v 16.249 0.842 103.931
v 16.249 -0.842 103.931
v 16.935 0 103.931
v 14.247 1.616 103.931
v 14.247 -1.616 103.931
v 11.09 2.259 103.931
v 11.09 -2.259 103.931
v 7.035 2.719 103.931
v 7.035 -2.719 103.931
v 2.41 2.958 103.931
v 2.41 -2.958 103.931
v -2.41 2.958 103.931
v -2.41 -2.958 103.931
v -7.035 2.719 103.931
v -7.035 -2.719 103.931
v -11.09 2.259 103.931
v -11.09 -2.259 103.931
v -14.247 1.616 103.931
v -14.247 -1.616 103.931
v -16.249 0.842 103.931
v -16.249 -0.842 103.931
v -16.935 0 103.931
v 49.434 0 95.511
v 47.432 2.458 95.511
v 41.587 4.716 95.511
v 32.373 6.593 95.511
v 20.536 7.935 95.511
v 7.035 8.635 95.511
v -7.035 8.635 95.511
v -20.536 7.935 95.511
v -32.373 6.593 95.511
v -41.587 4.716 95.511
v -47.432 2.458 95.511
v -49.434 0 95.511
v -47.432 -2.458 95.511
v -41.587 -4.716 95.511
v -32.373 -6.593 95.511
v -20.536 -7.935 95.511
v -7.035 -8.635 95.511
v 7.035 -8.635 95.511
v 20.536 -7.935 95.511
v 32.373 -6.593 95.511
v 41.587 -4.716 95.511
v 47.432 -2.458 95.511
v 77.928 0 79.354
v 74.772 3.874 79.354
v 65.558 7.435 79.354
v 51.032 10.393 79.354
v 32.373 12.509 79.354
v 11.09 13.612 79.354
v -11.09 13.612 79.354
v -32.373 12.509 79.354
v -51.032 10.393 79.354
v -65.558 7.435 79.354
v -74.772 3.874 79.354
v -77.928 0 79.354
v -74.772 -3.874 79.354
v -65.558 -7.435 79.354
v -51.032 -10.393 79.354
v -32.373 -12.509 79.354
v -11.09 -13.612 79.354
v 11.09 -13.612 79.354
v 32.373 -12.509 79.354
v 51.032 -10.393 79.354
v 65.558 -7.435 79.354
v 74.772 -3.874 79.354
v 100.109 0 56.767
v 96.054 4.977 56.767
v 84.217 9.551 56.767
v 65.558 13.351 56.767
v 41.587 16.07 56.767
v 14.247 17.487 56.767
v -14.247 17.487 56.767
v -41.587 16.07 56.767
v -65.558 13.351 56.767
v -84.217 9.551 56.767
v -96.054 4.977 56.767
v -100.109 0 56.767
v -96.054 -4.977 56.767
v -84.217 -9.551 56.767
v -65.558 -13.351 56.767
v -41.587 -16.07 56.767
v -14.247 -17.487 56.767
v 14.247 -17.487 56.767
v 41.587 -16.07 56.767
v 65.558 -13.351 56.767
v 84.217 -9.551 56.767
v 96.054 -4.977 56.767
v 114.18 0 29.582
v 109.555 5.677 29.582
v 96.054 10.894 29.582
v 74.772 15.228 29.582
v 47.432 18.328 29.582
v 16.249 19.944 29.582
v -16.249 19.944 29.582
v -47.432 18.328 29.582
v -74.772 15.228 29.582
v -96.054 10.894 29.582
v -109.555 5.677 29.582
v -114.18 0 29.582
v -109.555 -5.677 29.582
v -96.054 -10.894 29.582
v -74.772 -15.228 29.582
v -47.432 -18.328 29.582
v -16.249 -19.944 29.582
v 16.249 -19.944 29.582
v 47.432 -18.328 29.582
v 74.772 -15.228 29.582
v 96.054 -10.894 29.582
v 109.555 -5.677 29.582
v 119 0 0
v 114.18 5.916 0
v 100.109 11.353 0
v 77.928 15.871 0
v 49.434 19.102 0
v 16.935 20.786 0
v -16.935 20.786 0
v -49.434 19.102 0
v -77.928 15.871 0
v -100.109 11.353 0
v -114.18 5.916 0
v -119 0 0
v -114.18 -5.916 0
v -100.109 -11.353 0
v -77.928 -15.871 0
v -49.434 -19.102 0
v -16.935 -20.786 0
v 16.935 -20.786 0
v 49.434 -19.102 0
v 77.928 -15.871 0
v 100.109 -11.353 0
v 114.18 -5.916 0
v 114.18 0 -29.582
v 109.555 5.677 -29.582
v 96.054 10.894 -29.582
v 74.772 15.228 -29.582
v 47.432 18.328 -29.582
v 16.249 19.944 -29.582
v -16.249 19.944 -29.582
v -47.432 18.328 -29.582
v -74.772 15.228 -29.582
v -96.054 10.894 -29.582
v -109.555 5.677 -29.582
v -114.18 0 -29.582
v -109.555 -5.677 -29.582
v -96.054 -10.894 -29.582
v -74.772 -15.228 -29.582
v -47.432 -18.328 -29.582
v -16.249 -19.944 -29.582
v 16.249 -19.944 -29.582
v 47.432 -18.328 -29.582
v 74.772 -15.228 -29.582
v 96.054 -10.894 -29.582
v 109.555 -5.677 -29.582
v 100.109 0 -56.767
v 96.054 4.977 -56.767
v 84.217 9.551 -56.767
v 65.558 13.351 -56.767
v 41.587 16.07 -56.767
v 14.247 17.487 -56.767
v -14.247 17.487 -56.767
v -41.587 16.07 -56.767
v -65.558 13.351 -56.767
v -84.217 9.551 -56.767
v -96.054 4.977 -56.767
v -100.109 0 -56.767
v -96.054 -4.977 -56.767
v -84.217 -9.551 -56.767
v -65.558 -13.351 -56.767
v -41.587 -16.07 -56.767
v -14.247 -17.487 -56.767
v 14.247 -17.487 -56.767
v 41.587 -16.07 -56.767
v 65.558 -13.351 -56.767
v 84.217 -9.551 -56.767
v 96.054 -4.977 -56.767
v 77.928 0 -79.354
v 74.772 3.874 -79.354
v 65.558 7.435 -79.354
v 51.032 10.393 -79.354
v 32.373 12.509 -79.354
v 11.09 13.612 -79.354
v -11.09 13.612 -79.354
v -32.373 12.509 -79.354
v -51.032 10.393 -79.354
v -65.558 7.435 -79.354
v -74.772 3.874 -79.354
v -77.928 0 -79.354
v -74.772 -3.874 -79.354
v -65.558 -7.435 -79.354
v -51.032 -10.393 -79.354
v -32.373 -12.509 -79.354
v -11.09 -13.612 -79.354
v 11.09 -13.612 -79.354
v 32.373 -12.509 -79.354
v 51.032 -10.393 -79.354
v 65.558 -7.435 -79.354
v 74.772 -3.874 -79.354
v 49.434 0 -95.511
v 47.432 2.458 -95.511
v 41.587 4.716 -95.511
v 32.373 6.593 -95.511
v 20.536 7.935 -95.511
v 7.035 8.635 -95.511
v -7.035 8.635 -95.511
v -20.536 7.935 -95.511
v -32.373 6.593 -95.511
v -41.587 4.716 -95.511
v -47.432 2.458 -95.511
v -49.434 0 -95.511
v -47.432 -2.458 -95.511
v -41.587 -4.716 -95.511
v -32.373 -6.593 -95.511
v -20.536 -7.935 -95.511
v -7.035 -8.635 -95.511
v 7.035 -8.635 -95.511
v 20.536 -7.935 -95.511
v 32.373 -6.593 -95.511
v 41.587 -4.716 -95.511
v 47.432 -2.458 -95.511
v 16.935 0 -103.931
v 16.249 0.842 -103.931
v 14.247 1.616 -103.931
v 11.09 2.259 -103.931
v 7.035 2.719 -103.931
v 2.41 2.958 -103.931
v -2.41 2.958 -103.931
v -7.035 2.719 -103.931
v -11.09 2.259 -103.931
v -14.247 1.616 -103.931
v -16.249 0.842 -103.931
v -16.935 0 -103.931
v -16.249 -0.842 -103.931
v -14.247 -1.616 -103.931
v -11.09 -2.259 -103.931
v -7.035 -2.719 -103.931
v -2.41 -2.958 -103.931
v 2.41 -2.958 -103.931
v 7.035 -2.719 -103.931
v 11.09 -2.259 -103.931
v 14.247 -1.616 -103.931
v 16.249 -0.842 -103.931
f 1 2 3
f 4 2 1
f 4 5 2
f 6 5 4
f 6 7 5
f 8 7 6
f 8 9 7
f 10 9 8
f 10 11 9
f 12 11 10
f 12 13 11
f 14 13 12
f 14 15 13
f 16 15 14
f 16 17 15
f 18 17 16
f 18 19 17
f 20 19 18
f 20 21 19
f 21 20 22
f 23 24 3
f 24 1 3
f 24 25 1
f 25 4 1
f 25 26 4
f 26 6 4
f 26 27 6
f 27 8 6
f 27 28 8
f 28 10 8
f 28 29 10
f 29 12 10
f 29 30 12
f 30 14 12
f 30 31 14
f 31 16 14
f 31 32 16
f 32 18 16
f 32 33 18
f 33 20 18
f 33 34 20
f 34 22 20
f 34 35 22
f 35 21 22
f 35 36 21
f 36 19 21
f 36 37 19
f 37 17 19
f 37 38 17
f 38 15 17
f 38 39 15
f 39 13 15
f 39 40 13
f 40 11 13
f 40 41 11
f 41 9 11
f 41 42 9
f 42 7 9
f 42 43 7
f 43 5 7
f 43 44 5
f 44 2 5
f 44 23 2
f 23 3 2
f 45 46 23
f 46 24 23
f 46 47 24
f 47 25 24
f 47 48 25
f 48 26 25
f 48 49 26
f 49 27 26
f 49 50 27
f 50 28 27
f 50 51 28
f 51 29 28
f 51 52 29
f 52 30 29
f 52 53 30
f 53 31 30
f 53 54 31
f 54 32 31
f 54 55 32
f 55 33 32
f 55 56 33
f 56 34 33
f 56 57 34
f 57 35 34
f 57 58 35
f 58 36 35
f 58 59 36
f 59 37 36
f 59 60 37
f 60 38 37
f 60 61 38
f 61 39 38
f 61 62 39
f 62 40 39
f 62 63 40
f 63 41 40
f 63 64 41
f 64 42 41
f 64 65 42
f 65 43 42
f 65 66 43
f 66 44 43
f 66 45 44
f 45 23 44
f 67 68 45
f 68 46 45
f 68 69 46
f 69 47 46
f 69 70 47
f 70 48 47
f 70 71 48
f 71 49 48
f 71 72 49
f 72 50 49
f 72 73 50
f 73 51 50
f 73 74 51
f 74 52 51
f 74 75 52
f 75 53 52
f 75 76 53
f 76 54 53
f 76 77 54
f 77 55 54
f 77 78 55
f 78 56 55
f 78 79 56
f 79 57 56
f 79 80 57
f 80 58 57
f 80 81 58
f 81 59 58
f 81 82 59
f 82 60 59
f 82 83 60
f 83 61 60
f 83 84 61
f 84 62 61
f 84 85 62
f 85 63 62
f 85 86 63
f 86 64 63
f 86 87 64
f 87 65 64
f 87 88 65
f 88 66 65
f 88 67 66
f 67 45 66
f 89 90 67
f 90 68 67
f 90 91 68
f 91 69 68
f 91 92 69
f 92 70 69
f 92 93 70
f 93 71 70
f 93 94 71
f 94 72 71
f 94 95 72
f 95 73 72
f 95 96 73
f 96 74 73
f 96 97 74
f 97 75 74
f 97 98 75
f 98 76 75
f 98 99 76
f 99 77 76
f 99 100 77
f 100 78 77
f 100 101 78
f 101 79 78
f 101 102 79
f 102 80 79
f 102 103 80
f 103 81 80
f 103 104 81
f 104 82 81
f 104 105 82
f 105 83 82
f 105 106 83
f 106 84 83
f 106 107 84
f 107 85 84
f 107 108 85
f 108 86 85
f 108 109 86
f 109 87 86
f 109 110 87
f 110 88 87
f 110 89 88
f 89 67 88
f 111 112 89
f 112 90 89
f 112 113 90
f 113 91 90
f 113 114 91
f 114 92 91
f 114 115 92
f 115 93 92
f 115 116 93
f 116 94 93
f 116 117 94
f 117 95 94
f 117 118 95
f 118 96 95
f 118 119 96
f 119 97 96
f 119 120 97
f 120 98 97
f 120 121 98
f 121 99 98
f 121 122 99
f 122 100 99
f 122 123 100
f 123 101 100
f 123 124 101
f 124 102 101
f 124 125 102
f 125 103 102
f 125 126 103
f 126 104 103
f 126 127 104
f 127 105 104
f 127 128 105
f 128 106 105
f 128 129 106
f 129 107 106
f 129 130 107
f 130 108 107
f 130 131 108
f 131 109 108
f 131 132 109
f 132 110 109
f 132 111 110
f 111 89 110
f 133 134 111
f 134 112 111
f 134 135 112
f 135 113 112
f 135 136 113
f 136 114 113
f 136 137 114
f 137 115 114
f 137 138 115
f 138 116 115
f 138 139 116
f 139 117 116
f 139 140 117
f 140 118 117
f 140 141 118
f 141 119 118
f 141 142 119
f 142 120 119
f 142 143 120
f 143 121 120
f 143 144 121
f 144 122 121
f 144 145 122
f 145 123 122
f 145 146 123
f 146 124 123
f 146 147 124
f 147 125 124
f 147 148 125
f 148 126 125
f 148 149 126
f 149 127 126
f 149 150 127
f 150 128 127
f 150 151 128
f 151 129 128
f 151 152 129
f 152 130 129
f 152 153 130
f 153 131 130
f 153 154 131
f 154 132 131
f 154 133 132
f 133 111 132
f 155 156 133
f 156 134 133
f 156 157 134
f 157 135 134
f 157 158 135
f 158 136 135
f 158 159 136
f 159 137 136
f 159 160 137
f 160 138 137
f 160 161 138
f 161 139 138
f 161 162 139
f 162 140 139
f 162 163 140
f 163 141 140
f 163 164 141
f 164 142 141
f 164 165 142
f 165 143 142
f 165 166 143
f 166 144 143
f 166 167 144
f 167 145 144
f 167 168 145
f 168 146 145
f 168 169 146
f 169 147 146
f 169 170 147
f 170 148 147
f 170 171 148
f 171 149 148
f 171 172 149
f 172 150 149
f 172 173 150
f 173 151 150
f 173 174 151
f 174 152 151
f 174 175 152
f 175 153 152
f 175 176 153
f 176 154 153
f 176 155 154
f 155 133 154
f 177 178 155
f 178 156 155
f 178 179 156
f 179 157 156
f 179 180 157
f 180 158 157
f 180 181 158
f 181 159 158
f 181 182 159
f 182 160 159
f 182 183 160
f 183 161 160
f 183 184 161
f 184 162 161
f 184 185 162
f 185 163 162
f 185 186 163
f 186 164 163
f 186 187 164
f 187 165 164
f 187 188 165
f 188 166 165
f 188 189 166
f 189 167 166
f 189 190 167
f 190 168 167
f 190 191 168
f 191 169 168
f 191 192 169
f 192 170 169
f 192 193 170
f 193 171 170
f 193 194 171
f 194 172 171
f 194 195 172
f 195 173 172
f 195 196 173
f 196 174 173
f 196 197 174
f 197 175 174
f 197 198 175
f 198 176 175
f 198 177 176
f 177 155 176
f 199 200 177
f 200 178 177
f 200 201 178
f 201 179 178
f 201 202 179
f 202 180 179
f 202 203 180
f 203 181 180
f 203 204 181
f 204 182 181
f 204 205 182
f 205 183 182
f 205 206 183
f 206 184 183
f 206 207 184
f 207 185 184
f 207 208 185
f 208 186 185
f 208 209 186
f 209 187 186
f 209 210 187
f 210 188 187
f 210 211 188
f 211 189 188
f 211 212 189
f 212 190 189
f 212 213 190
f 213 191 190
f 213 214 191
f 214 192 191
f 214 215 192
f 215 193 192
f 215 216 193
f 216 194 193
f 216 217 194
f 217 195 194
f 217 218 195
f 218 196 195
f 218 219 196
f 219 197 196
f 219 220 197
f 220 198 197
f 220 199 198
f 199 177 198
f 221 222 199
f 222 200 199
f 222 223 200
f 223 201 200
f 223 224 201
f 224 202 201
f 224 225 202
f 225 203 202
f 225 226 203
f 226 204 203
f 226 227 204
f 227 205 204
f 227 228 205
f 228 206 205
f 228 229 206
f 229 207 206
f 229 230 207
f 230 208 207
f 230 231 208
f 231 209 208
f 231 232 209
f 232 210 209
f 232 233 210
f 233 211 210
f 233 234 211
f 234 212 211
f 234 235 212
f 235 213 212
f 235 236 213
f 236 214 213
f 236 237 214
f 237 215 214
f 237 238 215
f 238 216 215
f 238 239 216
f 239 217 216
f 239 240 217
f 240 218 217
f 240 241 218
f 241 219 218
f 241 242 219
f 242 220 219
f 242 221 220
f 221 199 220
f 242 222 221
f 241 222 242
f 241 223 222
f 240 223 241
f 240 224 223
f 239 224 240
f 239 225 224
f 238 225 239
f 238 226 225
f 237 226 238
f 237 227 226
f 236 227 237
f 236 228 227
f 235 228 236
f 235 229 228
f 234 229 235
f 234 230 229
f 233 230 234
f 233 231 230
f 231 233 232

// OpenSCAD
// Generated by SolidPython 1.0.1 on 2020-07-29 00:46:52


scale(v = [17, 3, 15]) {
	sphere(r = 7);
}
/***********************************************
*********      SolidPython code:      **********
************************************************
 
# import packages: SolidPython
from solid import *
from solid.utils import *
from itertools import chain, combinations, permutations


class Resize:

    def __init__(self, scad_file):
        self.scad_file = scad_file
        #self.scad_file = import_scad(scad_file)
        # cone/cylinder param:
        self.r1 = 0
        self.r2 = 0
        self.h = 0
        # rectangular prism param:
        self.w = 0
        self.l = 0
        # ellipse param:
        self.r = 0

    # import OpenScad code (file name corresponds to shape)


    # classify shape + parameters
    def assign(self, param1, param2, param3):
        if self.scad_file == 'cone.scad':
            self.r1 = param1
            self.r2 = param2
            self.h = param3
        elif self.scad_file == 'cylinder.scad':
            self.r1 = param1
            self.r2 = param2
            self.h = param3
        elif self.scad_file == 'rectangularPrism.scad':
            self.h = param1
            self.l = param2
            self.w = param3
        else:
            self.r = param1
            self.h = param2

    # resize parameters
    def iterate(self):
        x = range(3, 20, 2)
        i = 1
        if self.scad_file == 'cone.scad':
            tempList = list(permutations(x, 2))
            for temp in tempList:
                param1 = temp[0]
                param2 = temp[1]
                filepath = 'produced_scad_files/' + 'cone' + str(param1) + '_' + str(param2) + '_' + '.scad'
                scad_render_to_file(cylinder(h=param1, r1=param2, r2=0), filepath)

        elif self.scad_file == 'cylinder.scad':
            tempList = list(permutations(x, 3))
            for temp in tempList:
                param1 = temp[0]
                param2 = temp[1]
                filepath = 'produced_scad_files/' + 'cylinder' + str(param1) + '_' + str(param2) + '_' + '.scad'
                scad_render_to_file(cylinder(h=param1, r1=param2, r2=param2), filepath)

        elif self.scad_file == 'rectangularPrism.scad':
            tempList = list(permutations(x, 3))
            for temp in tempList:
                param1 = temp[0]
                param2 = temp[1]
                param3 = temp[2]
                filepath = 'produced_scad_files/' + 'rectangularPrism' + str(param1) + '_' + str(param2) + '_' + str(
                    param3) + '.scad'
                scad_render_to_file(cube(size=(param1, param2, param3)), filepath)

        elif self.scad_file == 'ellipse.scad':
            tempList = list(permutations(x, 4))
            for temp in tempList:
                param1 = temp[0]
                param2 = temp[1]
                param3 = temp[2]
                param4 = temp[3]
                filepath = 'produced_scad_files/' + 'ellipse' + str(param1) + '_' + str(param2) + '_' + str(param3) + '_' + str(param4) + '.scad'
                scad_render_to_file(scale([param1, param2, param3])(sphere(r=param4)), filepath)

    def render_to_scadfile(self):
        scad_render_to_file(scad, 'example.scad') 
 
************************************************/
